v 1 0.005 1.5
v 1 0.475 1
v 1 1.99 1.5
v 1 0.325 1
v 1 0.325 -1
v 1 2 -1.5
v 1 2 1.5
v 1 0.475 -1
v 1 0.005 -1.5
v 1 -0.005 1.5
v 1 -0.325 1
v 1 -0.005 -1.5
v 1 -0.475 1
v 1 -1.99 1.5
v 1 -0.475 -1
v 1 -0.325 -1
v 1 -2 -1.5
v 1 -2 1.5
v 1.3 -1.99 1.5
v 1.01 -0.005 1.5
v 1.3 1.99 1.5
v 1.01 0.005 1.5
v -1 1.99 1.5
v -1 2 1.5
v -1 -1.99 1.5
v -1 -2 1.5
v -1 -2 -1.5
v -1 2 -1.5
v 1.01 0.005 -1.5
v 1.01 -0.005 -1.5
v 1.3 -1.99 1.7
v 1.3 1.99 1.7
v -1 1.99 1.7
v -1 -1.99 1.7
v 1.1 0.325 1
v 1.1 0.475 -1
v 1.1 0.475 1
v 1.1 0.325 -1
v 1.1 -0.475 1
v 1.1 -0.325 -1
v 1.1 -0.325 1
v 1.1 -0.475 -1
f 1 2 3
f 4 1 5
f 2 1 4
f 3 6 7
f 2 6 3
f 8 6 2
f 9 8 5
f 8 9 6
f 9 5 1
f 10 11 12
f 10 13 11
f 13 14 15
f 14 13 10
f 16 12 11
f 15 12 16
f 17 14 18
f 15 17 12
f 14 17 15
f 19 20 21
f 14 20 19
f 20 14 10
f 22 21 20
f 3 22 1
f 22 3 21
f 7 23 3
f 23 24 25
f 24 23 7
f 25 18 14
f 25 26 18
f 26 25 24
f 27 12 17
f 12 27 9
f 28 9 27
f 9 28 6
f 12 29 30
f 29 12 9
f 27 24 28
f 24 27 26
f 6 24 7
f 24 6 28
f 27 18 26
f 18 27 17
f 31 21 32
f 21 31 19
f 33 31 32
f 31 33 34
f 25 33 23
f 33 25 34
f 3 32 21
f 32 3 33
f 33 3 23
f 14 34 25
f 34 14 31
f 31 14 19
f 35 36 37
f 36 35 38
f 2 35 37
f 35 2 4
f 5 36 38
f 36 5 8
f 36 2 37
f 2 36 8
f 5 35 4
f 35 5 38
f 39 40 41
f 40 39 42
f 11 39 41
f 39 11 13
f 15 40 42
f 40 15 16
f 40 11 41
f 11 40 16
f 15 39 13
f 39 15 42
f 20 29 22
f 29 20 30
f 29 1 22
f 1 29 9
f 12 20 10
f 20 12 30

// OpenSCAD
module Base_cabinet_01(){

    color("#9e9e9e")
    cube([2,4,3], center = true);              // Main Body

    translate([0.15,0.0,1.6]){       
        color("#c2c2c2")
        cube([2.3,3.98,0.2], center = true);   // Upper part
    }
    translate([1.05,0.4,0]){                
        color("#c2c2c2")
        cube([0.1,0.15,2], center = true);    // Handle
    }
    translate([1.05,-0.4,0]){               
        color("#c2c2c2")
        cube([0.1,0.15,2], center = true);    // Handle
    }
    translate([1.005,0,0]){       
        color("#000000")
        cube([0.01,0.01,3], center = true);   // Black Line
    }

}

Base_cabinet_01();


// Written by Nicolì Angelo (Gengio) 2024: 
// MIT License


//Permission is hereby granted, free of charge, to any person obtaining a copy of this software and associated documentation files (the "Software"), to deal in the Software without restriction, including without limitation the rights to use, copy, modify, merge, publish, distribute, sublicense, and/or sell copies of the Software, and to permit persons to whom the Software is furnished to do so, subject to the following conditions:

//The above copyright notice and this permission notice shall be included in all copies or substantial portions of the Software.

//THE SOFTWARE IS PROVIDED "AS IS", WITHOUT WARRANTY OF ANY KIND, EXPRESS OR IMPLIED, INCLUDING BUT NOT LIMITED TO THE WARRANTIES OF MERCHANTABILITY, FITNESS FOR A PARTICULAR PURPOSE AND NONINFRINGEMENT. IN NO EVENT SHALL THE AUTHORS OR COPYRIGHT HOLDERS BE LIABLE FOR ANY CLAIM, DAMAGES OR OTHER LIABILITY, WHETHER IN AN ACTION OF CONTRACT, TORT OR OTHERWISE, ARISING FROM, OUT OF OR IN CONNECTION WITH THE SOFTWARE OR THE USE OR OTHER DEALINGS IN THE SOFTWARE.
